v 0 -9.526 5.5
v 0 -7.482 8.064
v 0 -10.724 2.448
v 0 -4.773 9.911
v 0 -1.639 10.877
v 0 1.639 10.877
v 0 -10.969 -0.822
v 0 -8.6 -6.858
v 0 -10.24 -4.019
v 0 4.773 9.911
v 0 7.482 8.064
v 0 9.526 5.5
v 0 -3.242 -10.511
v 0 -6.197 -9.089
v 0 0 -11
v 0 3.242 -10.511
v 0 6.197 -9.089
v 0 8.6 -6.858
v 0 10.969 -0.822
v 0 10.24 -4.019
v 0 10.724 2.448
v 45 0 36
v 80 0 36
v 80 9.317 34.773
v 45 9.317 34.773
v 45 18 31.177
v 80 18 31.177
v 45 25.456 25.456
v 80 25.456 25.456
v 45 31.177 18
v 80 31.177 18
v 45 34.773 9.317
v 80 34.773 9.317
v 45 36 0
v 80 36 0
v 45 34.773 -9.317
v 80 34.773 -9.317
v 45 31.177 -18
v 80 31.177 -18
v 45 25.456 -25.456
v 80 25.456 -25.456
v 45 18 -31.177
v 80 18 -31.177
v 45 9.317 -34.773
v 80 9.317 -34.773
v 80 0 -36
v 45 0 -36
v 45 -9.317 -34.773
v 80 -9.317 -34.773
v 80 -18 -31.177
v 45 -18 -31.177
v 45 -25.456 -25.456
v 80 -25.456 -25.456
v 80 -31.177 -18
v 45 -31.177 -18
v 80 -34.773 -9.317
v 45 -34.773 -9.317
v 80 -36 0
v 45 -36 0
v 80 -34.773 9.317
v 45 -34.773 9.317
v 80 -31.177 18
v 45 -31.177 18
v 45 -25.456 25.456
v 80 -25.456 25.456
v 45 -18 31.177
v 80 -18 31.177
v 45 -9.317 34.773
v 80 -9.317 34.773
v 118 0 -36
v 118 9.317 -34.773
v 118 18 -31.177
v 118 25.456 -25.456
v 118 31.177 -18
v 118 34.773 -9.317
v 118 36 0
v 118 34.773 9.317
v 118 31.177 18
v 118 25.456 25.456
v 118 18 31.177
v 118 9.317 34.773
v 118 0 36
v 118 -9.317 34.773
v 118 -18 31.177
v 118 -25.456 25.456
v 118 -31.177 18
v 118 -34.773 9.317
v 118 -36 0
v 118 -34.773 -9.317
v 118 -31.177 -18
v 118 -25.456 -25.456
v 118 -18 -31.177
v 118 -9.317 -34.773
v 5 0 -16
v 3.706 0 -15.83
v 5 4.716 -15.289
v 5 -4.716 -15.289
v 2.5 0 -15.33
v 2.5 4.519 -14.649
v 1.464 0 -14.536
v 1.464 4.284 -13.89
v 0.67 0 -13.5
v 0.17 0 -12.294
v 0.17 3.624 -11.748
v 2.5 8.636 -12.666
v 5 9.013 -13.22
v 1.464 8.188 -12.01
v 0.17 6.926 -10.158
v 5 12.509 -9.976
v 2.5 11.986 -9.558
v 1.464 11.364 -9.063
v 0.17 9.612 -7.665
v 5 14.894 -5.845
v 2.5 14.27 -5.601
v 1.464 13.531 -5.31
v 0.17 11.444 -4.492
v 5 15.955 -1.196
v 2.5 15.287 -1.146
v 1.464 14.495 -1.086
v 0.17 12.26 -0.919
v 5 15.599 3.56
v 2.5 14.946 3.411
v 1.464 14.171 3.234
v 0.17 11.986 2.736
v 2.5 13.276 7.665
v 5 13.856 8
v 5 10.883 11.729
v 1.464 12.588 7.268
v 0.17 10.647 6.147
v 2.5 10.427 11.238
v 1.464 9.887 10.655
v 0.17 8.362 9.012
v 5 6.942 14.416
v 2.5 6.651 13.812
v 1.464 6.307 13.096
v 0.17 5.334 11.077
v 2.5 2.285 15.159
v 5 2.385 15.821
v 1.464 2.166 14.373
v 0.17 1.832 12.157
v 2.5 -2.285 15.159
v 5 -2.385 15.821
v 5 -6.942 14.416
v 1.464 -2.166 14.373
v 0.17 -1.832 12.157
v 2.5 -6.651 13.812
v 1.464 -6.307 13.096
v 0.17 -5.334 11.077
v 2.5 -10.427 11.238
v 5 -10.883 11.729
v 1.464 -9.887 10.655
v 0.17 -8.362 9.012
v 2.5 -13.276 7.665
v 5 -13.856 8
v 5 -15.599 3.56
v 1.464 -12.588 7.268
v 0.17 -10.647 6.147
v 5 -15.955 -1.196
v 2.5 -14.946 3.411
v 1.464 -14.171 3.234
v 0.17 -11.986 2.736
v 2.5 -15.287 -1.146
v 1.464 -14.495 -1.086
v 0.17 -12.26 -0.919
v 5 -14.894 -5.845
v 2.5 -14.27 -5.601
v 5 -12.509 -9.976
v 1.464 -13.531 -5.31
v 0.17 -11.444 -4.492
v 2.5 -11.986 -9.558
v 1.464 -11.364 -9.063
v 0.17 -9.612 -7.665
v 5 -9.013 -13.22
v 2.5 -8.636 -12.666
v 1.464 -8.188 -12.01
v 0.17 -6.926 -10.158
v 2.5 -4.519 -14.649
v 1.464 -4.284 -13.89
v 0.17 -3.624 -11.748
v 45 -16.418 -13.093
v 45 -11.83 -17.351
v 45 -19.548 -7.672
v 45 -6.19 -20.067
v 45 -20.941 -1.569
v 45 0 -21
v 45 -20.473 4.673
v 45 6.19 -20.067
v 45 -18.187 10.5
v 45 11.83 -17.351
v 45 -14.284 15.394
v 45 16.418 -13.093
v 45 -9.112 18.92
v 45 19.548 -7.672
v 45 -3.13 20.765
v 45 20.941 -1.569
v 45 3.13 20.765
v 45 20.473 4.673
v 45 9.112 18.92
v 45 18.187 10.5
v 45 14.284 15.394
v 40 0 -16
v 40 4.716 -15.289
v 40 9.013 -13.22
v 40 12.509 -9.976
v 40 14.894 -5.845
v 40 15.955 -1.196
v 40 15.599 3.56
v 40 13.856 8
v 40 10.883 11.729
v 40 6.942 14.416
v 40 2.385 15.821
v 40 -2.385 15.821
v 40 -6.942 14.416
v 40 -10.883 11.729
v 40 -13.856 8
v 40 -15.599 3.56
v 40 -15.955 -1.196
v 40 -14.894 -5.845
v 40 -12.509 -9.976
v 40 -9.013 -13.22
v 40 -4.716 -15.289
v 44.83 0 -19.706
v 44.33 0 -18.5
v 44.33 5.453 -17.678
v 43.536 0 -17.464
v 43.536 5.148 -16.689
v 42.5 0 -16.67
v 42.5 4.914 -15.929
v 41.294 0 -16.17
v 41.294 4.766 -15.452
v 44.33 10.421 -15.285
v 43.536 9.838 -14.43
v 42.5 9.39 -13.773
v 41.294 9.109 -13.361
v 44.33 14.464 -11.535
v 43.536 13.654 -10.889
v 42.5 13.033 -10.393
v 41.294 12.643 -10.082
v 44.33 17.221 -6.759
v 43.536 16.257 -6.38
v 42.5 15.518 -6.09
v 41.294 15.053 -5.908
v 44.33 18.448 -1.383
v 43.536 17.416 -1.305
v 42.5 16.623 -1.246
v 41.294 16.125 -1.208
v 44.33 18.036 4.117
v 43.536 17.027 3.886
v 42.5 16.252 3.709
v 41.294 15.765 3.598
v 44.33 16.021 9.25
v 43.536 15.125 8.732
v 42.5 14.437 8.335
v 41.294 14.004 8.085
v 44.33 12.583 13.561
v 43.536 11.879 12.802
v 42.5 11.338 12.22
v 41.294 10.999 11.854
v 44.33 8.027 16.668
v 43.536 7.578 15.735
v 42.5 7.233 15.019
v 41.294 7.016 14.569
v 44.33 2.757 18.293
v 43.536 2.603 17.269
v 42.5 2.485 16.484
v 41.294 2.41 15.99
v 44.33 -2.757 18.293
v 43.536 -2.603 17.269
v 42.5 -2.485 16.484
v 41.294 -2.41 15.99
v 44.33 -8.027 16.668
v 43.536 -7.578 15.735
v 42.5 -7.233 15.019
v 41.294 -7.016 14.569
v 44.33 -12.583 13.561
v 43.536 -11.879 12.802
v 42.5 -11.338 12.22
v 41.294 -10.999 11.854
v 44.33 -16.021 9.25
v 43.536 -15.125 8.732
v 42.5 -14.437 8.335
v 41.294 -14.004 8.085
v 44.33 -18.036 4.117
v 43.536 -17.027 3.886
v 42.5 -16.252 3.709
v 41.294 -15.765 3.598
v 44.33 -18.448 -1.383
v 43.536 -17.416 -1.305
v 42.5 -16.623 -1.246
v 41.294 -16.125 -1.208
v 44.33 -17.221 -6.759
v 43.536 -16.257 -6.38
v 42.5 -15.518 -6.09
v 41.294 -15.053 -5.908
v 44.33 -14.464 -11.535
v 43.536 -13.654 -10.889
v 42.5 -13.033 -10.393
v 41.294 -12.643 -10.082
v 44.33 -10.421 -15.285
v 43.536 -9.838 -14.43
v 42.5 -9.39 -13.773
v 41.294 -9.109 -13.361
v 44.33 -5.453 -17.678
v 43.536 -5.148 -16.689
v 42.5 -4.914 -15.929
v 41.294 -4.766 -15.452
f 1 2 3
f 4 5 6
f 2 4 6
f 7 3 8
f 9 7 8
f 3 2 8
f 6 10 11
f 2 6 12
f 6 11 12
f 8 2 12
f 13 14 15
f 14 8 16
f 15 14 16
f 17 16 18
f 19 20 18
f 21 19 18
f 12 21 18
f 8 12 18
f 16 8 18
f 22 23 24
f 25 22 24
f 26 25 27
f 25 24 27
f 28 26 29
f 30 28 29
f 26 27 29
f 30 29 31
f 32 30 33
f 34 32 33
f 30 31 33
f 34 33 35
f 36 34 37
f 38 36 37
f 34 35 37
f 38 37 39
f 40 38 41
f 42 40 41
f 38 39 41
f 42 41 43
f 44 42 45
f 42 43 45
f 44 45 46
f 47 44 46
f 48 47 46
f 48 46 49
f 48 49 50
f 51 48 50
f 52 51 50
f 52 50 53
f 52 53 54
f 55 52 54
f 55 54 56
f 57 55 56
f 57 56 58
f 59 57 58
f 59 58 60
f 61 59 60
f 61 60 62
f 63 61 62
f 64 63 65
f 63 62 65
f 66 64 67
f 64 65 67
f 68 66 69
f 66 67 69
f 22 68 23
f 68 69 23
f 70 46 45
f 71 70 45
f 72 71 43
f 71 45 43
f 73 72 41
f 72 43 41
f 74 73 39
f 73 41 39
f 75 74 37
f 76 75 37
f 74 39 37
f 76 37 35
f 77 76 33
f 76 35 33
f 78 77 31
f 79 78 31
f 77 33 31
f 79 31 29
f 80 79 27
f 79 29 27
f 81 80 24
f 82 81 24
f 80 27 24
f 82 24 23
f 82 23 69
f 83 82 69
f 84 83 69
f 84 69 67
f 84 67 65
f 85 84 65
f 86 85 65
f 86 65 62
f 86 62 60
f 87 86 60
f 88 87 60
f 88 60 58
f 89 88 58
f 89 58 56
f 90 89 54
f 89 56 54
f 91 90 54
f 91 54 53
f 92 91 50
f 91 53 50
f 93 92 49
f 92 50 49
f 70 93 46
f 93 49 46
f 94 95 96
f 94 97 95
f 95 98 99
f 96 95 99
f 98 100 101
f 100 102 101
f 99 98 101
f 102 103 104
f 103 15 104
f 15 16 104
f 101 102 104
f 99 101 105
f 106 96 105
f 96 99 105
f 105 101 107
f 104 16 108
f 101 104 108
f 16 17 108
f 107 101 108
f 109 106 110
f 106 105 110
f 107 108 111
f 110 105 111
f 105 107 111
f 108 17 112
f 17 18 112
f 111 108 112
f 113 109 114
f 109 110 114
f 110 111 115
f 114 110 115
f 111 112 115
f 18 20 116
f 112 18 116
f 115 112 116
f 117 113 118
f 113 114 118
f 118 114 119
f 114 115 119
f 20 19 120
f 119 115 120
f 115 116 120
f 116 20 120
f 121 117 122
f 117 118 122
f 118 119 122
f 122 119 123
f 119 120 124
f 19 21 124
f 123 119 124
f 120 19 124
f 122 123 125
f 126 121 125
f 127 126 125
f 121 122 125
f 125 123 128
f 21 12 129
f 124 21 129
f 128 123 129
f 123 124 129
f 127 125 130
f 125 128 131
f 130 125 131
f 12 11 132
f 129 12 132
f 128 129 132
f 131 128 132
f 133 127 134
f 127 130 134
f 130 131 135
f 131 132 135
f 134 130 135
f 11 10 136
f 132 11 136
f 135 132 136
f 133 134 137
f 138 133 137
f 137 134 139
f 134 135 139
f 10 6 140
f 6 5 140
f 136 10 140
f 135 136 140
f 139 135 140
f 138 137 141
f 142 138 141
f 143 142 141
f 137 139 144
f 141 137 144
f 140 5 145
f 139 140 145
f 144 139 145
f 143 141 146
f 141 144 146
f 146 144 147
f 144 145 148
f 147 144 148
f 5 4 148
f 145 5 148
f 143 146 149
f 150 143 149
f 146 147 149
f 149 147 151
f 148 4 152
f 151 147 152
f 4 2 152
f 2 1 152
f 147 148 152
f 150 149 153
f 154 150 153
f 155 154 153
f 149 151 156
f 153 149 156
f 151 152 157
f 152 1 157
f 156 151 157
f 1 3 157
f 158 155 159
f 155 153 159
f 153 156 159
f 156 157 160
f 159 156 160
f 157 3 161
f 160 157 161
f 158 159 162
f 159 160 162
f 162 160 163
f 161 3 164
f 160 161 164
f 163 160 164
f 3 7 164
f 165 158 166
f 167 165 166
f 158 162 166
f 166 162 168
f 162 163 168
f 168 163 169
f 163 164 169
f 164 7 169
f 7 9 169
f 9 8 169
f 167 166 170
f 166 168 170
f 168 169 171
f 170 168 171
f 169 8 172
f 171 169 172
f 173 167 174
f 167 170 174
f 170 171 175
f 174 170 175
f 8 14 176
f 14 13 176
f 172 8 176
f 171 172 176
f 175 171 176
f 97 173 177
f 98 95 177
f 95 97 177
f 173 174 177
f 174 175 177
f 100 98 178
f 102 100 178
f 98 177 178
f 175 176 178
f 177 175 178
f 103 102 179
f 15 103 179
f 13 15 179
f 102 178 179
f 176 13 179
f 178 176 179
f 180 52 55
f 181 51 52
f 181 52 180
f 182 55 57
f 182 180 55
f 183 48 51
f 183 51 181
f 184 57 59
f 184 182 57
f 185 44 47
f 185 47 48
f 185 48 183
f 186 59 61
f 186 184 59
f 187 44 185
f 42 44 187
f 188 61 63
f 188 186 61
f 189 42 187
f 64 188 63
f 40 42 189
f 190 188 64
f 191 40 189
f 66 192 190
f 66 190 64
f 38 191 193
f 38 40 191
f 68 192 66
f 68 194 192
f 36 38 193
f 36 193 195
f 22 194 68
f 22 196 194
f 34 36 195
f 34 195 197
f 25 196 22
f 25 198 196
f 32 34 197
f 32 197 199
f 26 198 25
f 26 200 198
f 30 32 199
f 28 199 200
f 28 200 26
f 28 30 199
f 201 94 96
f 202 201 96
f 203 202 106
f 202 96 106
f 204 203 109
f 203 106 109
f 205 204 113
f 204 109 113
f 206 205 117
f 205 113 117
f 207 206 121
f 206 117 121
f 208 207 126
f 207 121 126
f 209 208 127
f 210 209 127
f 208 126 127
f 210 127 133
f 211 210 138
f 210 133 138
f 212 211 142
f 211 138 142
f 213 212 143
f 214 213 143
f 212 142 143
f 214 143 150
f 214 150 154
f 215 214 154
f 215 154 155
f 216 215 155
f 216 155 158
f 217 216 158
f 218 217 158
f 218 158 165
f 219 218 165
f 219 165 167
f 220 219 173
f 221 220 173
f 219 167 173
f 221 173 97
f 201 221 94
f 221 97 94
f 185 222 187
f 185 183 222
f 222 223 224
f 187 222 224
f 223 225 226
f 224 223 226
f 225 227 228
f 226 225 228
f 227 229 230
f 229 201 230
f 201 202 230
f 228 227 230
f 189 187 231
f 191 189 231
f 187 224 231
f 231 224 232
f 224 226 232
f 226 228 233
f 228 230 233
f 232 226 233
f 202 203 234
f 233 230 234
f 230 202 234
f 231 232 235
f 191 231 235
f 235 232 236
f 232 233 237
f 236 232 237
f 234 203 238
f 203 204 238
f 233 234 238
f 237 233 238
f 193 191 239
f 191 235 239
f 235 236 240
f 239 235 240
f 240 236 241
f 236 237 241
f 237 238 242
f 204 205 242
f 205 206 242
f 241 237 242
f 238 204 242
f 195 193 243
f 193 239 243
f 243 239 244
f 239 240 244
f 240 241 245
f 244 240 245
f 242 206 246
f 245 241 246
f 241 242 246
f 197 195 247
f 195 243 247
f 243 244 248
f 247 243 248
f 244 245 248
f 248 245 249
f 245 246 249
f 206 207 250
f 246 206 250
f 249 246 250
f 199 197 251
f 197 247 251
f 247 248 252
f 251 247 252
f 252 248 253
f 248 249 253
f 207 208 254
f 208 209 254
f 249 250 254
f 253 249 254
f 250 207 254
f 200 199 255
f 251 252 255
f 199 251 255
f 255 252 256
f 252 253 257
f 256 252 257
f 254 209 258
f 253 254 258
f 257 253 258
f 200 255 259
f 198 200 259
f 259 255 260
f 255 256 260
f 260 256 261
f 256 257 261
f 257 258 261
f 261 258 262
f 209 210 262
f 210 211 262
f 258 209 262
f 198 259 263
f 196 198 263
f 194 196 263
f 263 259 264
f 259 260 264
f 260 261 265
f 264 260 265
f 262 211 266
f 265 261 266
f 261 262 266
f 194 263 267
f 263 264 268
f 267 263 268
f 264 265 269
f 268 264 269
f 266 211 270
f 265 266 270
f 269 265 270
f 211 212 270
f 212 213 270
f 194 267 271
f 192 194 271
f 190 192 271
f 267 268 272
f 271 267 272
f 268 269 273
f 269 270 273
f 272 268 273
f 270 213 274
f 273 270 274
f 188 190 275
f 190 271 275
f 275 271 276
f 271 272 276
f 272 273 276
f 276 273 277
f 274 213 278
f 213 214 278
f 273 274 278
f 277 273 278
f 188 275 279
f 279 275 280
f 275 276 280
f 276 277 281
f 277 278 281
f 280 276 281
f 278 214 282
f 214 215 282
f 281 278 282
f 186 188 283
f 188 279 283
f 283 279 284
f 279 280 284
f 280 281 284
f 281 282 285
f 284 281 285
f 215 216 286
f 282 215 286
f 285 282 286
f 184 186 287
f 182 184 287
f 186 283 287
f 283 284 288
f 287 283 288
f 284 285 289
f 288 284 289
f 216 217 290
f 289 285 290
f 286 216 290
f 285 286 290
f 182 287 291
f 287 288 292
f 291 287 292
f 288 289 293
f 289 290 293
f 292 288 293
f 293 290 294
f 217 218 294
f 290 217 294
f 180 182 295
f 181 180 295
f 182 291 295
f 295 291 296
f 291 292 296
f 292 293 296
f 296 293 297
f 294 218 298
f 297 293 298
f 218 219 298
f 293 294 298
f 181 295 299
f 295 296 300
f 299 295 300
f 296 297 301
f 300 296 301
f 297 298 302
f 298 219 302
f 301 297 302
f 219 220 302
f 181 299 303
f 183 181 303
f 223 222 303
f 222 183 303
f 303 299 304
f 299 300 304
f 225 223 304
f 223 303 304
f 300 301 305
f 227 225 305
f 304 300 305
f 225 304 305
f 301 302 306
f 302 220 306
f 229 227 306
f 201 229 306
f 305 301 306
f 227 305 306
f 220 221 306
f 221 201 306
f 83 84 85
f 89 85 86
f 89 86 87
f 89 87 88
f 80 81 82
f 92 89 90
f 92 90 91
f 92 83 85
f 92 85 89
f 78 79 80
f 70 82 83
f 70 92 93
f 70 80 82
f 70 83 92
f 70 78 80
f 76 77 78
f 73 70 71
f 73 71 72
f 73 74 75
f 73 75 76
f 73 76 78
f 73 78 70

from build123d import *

# Parameters (mm, degrees)
SKETCH3_R           = 16
BOSS_EXTRUDE1_DEPTH = 80
SKETCH4_R           = 36
BOSS_EXTRUDE2_DEPTH = 38
SKETCH6_R           = 36
SKETCH6_R_2         = 16
BOSS_EXTRUDE3_DEPTH = 35
FILLET1_R           = 5


with BuildPart() as part:
    # Sketch3 → Boss-Extrude1 (new body)
    with BuildSketch(Plane(origin=(0, 0, 0), x_dir=(0, 0, -1), z_dir=(1, 0, 0))):
        Circle(SKETCH3_R)
    extrude(amount=BOSS_EXTRUDE1_DEPTH)

    # Sketch4 → Boss-Extrude2 (add)
    with BuildSketch(Plane(origin=(80, 0, 0), x_dir=(0, 0, -1), z_dir=(1, 0, 0))):
        Circle(SKETCH4_R)
    extrude(amount=BOSS_EXTRUDE2_DEPTH)

    # Sketch6 → Boss-Extrude3 (add)
    with BuildSketch(Plane.ZY.offset(-80)):
        Circle(SKETCH6_R)
        Circle(SKETCH6_R_2, mode=Mode.SUBTRACT)
    extrude(amount=BOSS_EXTRUDE3_DEPTH)

    # Fillet1
    fillet1_edges = [part.edges().sort_by_distance(p)[0] for p in [
        (45, 0, 16),
        (0, 0, 16),
    ]]
    fillet(fillet1_edges, radius=FILLET1_R)


solid = part.part
